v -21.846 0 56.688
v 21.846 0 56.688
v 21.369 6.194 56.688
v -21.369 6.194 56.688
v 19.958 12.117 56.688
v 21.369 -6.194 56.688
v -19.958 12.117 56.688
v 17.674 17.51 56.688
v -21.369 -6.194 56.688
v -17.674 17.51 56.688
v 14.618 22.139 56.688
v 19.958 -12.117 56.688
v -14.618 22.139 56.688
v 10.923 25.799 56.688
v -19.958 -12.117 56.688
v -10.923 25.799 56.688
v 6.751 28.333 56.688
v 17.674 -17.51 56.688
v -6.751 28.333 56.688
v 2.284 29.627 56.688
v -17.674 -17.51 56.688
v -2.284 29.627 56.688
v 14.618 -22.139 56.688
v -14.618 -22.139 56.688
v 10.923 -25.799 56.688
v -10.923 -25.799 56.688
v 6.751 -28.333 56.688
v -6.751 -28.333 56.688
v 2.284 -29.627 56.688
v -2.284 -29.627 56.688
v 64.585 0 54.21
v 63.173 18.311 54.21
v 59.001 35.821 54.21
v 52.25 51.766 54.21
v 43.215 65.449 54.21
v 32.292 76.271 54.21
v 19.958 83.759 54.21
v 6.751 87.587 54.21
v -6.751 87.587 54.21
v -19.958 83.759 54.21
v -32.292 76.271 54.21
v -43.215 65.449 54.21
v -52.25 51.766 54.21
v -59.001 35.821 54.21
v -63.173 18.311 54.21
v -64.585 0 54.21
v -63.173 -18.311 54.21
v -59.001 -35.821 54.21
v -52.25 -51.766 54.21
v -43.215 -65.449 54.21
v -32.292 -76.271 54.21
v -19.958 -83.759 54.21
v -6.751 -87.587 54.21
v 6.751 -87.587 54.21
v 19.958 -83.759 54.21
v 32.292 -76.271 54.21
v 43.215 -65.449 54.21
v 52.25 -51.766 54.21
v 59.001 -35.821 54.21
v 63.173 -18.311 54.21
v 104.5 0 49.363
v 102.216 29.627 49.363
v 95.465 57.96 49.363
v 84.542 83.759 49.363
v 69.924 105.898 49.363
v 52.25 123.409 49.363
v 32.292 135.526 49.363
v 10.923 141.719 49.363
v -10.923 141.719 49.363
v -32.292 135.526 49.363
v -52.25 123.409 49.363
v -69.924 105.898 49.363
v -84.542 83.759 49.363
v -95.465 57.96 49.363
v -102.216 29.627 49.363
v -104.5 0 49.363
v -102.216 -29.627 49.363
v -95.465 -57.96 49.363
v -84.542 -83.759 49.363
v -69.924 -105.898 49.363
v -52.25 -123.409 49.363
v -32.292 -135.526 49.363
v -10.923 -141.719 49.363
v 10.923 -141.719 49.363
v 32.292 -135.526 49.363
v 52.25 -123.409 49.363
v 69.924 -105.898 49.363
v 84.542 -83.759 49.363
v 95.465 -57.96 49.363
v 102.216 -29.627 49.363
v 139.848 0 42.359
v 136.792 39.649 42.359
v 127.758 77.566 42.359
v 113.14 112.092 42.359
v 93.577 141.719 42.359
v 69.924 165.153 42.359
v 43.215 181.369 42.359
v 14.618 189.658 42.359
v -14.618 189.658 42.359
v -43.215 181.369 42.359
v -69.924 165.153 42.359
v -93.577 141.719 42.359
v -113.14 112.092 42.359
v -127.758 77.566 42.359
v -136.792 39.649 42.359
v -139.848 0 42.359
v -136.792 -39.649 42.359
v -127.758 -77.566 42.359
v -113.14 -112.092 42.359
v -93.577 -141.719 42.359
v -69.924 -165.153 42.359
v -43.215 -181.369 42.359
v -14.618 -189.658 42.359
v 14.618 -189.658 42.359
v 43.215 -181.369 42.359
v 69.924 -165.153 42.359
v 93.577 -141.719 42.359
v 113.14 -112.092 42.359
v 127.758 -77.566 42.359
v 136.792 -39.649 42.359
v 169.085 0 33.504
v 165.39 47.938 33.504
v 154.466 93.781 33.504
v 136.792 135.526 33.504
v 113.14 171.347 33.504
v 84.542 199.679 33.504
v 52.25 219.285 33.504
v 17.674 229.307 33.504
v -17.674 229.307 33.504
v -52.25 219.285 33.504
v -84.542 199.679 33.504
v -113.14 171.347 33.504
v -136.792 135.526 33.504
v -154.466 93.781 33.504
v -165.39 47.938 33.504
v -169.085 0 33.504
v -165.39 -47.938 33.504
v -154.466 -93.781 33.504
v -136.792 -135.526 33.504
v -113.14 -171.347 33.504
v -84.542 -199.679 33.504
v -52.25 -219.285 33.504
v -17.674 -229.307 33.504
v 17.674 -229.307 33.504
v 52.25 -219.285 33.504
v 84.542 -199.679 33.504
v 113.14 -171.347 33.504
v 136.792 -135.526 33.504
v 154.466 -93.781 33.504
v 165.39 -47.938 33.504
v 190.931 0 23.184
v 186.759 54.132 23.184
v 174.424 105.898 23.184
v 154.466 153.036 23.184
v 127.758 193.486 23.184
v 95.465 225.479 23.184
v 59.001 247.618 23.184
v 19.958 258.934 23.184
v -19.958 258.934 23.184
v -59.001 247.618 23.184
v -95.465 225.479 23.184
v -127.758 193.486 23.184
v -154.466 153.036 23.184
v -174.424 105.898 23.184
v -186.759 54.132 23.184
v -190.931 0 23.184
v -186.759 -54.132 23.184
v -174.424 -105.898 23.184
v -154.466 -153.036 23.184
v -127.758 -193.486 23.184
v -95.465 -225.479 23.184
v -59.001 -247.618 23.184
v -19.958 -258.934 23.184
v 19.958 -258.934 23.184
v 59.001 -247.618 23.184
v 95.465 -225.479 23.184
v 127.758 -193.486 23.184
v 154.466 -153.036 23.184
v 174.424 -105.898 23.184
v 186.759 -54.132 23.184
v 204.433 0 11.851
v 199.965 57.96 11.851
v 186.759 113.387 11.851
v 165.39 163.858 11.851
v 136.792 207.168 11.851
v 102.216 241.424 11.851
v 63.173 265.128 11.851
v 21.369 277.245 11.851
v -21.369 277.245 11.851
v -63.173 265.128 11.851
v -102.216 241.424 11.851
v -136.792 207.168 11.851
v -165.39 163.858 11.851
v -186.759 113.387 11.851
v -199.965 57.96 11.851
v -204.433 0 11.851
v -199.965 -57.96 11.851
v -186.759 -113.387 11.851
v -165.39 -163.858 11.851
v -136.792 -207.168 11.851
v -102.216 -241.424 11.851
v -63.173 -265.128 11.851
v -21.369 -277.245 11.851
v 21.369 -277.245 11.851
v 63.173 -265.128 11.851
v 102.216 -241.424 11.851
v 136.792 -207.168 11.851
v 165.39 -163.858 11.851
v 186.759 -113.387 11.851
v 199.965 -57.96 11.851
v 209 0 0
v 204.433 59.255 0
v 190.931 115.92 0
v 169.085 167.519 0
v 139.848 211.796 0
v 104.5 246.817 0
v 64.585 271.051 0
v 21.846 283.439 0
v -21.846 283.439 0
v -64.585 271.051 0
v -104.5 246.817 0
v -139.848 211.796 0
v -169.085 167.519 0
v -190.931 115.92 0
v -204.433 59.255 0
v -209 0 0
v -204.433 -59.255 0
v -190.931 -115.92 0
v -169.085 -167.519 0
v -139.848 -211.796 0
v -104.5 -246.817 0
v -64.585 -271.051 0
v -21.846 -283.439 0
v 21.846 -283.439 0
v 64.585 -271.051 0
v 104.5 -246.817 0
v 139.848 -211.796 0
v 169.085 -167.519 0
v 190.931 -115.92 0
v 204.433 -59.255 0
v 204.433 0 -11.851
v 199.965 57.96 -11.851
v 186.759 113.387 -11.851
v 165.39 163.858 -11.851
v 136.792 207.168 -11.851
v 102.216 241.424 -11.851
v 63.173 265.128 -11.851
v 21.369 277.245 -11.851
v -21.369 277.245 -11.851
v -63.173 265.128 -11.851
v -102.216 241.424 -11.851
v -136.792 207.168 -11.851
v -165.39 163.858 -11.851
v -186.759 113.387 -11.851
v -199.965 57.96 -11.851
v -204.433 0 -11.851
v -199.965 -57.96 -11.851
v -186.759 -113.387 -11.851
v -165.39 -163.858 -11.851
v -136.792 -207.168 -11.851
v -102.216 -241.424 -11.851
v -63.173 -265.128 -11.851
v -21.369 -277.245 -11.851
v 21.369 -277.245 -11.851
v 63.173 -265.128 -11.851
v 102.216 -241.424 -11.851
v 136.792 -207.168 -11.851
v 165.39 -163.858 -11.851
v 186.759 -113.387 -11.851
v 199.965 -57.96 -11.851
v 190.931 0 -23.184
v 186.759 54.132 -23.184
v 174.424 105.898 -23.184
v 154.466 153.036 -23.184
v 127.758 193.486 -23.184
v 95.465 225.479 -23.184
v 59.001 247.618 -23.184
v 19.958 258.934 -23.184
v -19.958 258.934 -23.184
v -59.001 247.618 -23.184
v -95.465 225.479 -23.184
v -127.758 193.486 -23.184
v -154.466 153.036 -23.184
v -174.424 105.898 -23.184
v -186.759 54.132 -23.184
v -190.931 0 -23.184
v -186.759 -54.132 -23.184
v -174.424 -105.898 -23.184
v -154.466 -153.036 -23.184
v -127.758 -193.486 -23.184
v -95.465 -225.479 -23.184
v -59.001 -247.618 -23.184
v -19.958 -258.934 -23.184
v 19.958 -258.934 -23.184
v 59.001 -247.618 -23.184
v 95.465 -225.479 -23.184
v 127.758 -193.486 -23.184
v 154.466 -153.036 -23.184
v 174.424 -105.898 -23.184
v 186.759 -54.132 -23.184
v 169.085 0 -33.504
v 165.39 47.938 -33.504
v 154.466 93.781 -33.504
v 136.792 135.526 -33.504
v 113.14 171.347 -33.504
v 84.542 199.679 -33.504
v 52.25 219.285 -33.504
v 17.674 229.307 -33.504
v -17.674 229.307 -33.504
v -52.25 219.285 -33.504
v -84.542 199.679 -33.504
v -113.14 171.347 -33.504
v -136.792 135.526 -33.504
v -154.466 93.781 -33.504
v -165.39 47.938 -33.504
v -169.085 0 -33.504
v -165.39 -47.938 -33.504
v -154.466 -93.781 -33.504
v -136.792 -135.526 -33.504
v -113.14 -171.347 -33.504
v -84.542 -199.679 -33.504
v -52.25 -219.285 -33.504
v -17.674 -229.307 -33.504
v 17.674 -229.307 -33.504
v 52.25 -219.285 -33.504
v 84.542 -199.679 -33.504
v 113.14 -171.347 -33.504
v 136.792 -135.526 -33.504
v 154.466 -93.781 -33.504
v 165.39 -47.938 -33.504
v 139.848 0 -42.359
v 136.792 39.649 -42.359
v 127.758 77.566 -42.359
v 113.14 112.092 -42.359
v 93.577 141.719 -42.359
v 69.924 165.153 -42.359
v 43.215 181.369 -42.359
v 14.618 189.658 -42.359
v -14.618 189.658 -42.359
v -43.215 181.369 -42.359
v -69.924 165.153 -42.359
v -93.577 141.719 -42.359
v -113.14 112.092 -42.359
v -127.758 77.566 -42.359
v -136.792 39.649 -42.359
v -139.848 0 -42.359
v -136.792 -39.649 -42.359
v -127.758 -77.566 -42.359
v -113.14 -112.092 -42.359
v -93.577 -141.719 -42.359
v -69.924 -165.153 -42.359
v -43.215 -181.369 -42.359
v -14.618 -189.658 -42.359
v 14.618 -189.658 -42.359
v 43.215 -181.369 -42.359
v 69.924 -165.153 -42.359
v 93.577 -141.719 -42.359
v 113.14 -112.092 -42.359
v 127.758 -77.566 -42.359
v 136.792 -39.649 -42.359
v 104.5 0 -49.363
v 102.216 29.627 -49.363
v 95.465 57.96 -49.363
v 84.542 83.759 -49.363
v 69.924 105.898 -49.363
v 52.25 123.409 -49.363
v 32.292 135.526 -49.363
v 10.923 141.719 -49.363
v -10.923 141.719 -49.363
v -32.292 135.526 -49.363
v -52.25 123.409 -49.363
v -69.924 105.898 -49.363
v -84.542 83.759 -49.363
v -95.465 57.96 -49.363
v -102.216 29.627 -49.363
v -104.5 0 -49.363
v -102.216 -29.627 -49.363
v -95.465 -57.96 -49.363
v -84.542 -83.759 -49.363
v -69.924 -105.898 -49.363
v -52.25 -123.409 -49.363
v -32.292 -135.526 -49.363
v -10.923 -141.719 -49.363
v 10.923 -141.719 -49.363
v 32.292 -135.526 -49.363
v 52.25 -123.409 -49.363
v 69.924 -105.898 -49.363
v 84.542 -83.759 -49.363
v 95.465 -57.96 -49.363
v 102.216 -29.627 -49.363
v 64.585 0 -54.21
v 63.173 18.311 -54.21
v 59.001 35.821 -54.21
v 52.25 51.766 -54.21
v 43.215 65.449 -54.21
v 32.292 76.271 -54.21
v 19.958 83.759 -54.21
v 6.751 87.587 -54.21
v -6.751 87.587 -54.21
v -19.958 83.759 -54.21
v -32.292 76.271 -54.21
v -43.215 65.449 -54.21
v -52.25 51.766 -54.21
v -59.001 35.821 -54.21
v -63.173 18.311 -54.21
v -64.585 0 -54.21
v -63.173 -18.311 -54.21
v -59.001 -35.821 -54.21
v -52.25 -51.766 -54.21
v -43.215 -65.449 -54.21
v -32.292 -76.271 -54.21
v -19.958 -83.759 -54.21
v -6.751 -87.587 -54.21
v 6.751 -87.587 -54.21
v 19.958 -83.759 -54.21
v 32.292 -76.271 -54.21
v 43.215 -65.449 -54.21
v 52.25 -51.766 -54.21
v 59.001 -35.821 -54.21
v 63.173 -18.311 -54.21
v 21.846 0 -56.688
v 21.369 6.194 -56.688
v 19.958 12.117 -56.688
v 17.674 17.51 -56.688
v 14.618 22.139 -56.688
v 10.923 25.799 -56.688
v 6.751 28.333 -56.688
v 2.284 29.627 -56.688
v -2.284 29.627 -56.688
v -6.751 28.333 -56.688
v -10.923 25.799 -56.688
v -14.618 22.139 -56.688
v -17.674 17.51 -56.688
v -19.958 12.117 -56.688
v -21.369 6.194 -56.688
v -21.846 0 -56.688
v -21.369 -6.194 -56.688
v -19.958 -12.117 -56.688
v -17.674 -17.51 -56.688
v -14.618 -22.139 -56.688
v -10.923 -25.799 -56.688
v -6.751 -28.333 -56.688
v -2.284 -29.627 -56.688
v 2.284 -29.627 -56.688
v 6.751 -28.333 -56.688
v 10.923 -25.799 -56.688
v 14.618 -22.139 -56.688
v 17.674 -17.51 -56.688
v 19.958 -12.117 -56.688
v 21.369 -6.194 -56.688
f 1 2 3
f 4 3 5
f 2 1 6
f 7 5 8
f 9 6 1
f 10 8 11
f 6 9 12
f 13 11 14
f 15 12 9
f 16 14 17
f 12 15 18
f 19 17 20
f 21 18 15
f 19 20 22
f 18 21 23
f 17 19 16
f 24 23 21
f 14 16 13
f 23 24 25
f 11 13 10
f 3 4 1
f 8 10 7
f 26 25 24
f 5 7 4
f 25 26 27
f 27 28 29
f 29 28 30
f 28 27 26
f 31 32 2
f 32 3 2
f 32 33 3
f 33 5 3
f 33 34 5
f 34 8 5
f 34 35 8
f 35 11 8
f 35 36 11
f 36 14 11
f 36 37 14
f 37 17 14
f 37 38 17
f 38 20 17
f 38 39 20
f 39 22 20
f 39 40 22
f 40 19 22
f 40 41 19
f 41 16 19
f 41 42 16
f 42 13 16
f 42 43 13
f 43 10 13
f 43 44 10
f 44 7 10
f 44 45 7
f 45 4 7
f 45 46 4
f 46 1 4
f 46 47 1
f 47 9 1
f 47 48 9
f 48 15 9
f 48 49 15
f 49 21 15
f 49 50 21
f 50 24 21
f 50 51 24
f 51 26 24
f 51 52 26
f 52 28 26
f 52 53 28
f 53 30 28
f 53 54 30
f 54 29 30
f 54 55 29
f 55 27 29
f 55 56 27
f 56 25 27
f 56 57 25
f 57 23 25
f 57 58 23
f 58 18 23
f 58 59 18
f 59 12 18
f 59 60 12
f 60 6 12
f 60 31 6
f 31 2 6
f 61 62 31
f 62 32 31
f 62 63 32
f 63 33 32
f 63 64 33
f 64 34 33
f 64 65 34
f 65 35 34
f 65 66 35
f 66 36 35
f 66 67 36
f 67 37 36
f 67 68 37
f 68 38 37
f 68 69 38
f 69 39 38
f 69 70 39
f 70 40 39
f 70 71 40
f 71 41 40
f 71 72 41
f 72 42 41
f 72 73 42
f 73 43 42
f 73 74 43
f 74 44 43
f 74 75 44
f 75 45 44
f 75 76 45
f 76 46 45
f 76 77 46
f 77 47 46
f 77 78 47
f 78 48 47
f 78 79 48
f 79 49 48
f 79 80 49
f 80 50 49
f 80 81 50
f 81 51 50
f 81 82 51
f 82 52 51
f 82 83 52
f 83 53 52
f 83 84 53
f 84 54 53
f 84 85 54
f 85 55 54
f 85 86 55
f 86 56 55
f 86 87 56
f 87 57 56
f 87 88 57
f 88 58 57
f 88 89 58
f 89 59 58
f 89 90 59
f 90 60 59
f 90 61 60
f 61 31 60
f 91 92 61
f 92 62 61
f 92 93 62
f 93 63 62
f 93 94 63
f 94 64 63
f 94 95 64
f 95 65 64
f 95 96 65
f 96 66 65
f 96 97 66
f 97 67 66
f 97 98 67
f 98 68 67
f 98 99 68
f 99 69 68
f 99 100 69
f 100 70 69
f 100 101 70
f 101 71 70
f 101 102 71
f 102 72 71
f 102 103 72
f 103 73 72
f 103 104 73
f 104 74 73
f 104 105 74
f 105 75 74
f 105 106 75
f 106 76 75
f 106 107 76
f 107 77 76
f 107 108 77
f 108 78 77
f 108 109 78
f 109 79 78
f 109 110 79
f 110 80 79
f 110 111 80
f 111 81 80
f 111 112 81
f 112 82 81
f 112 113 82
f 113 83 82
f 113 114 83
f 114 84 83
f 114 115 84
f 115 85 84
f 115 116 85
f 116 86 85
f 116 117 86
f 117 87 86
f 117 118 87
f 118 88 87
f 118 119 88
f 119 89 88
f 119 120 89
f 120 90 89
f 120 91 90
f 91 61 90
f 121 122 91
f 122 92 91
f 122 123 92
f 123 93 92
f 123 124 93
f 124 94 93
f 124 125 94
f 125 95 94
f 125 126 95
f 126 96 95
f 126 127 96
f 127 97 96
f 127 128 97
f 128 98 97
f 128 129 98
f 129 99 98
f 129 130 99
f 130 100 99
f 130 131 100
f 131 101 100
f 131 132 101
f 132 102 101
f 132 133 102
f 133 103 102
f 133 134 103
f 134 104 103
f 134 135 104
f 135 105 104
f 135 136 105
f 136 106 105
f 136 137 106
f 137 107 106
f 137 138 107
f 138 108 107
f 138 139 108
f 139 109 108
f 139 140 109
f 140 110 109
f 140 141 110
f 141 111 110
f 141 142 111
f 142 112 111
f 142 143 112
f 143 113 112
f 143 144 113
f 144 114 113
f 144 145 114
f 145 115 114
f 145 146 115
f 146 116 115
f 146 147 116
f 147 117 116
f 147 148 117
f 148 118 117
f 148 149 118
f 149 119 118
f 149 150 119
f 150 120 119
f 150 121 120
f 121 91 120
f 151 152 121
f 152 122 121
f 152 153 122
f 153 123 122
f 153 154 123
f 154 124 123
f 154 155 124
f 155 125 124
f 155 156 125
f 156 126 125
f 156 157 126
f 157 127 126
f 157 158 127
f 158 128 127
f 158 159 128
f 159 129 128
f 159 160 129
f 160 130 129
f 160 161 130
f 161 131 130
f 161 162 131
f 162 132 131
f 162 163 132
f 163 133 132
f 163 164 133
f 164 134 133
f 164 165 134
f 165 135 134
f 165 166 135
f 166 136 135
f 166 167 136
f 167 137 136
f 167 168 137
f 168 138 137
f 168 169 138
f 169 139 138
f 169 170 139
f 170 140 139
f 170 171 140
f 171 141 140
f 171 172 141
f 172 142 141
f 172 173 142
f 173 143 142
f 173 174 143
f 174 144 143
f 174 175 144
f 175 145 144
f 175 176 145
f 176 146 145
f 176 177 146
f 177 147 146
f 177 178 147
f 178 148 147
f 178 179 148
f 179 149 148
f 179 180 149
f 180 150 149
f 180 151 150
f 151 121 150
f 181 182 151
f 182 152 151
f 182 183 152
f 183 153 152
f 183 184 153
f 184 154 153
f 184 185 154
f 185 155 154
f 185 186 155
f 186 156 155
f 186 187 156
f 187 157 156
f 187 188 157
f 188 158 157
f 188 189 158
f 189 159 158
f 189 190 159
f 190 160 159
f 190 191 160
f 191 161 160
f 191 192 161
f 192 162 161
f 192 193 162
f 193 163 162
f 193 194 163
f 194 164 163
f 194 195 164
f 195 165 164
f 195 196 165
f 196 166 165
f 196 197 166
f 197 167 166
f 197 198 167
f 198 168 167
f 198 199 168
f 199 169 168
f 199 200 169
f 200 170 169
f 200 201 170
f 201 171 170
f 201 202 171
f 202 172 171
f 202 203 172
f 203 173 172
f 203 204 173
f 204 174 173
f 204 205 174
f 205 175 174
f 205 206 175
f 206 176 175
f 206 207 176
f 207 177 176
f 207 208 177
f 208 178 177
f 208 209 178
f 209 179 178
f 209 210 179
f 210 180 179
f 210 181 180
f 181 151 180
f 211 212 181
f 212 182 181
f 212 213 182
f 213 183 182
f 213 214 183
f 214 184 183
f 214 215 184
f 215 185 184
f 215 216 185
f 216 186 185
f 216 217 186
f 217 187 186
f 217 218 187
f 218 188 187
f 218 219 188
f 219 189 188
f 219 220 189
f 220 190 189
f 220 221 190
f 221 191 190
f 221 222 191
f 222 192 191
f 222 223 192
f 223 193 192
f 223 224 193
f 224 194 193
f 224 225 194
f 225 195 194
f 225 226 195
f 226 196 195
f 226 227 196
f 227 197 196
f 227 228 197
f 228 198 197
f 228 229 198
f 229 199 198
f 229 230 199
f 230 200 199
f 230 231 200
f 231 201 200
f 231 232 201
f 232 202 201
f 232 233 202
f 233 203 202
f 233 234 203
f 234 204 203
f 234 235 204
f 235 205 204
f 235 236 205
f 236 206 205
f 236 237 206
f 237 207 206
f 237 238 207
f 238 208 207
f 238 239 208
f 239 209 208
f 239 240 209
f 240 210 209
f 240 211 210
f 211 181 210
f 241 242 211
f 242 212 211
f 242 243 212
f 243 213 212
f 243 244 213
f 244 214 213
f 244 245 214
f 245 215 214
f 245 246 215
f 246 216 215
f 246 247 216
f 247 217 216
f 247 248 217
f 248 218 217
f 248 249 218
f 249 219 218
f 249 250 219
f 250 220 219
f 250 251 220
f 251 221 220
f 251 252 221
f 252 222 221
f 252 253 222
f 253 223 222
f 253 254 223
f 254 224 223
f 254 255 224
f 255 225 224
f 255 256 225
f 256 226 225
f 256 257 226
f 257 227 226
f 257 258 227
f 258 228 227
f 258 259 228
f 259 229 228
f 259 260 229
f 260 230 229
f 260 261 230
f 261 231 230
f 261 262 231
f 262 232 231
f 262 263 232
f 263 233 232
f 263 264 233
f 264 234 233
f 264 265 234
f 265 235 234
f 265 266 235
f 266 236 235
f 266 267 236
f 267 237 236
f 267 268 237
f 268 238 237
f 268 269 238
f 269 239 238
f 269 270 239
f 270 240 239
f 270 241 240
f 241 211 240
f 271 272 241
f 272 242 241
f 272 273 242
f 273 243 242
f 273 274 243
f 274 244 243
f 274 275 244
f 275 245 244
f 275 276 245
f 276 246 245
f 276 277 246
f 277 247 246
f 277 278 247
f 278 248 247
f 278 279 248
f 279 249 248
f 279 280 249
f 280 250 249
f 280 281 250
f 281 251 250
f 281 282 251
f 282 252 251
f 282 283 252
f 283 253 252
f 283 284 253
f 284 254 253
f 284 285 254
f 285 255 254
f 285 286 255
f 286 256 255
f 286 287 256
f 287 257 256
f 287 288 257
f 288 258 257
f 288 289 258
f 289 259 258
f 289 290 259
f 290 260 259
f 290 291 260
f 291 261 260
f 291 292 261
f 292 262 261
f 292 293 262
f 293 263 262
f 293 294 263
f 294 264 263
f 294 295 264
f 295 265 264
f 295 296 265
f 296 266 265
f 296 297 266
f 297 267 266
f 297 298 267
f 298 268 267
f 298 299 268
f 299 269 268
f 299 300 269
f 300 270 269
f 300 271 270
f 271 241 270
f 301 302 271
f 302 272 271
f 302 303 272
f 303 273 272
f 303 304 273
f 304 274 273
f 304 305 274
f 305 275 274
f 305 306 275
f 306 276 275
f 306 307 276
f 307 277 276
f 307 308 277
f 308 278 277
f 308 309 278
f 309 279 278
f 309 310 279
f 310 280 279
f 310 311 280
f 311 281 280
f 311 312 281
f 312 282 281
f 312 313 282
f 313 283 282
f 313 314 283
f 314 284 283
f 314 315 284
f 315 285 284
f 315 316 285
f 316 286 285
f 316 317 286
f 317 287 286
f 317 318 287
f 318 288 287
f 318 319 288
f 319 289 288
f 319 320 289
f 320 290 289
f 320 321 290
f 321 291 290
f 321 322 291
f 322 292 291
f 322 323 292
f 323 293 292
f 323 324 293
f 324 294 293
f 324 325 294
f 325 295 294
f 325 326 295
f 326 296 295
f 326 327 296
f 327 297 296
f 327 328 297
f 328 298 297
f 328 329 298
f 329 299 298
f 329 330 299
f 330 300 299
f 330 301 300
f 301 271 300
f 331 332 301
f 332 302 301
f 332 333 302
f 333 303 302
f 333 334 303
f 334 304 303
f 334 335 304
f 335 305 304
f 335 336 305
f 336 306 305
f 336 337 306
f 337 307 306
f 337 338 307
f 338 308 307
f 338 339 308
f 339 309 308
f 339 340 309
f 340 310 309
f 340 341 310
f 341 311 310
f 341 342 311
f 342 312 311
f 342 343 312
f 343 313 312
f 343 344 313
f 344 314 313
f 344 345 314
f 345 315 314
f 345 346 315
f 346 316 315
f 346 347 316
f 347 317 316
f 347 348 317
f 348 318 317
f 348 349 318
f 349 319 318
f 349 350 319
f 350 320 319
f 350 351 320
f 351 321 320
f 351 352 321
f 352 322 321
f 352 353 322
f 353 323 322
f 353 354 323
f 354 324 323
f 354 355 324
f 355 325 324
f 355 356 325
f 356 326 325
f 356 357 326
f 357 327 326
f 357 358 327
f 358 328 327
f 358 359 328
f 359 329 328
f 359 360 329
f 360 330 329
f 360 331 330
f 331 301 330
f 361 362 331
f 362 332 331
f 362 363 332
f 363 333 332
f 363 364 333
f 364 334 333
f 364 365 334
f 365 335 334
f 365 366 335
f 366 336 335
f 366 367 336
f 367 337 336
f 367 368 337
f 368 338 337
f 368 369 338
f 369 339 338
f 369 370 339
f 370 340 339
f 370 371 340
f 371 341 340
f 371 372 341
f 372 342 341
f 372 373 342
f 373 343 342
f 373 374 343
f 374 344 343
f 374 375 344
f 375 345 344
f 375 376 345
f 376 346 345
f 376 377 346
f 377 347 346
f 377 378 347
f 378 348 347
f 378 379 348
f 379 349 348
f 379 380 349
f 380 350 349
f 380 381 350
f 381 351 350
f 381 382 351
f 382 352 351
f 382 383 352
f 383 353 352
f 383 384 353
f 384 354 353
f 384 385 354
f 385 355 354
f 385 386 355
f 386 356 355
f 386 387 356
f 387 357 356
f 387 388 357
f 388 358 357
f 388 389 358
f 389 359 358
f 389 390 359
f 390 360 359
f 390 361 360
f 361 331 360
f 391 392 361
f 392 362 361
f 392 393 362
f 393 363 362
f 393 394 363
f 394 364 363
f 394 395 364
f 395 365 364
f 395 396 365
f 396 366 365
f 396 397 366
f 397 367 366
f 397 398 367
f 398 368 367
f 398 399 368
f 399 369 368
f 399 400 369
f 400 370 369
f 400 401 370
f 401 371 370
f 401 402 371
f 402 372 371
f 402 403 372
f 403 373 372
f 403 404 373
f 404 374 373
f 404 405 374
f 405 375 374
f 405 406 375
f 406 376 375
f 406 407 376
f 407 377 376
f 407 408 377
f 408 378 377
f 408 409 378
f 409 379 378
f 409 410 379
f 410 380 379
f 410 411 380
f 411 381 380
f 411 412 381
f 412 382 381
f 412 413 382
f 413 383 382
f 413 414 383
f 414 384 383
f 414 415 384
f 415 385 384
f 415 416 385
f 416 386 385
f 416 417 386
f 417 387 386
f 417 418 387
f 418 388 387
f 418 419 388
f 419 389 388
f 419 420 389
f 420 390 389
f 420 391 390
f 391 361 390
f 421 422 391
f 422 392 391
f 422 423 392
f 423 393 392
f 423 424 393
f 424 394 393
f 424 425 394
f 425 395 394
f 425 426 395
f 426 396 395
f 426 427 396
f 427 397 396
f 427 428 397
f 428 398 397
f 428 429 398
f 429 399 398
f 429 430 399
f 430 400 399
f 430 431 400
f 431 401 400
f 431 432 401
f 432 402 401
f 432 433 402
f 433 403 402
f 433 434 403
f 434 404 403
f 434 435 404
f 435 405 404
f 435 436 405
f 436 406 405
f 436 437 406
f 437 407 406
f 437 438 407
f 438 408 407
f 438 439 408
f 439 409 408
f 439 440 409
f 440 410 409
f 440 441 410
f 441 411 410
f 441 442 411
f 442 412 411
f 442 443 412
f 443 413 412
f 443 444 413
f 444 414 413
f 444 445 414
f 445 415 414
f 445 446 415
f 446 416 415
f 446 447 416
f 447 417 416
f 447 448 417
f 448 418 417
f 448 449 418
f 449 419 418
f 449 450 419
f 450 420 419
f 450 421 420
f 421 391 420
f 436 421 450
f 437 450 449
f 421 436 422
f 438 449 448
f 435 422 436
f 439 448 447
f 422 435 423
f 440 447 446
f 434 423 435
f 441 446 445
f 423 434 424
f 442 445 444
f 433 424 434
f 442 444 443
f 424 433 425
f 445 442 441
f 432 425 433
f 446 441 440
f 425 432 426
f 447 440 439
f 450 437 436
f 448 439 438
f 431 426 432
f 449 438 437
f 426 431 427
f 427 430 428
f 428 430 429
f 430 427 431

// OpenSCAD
// Generated by SolidPython 1.0.1 on 2020-07-29 00:46:50


scale(v = [11, 15, 3]) {
	sphere(r = 19);
}
/***********************************************
*********      SolidPython code:      **********
************************************************
 
# import packages: SolidPython
from solid import *
from solid.utils import *
from itertools import chain, combinations, permutations


class Resize:

    def __init__(self, scad_file):
        self.scad_file = scad_file
        #self.scad_file = import_scad(scad_file)
        # cone/cylinder param:
        self.r1 = 0
        self.r2 = 0
        self.h = 0
        # rectangular prism param:
        self.w = 0
        self.l = 0
        # ellipse param:
        self.r = 0

    # import OpenScad code (file name corresponds to shape)


    # classify shape + parameters
    def assign(self, param1, param2, param3):
        if self.scad_file == 'cone.scad':
            self.r1 = param1
            self.r2 = param2
            self.h = param3
        elif self.scad_file == 'cylinder.scad':
            self.r1 = param1
            self.r2 = param2
            self.h = param3
        elif self.scad_file == 'rectangularPrism.scad':
            self.h = param1
            self.l = param2
            self.w = param3
        else:
            self.r = param1
            self.h = param2

    # resize parameters
    def iterate(self):
        x = range(3, 20, 2)
        i = 1
        if self.scad_file == 'cone.scad':
            tempList = list(permutations(x, 2))
            for temp in tempList:
                param1 = temp[0]
                param2 = temp[1]
                filepath = 'produced_scad_files/' + 'cone' + str(param1) + '_' + str(param2) + '_' + '.scad'
                scad_render_to_file(cylinder(h=param1, r1=param2, r2=0), filepath)

        elif self.scad_file == 'cylinder.scad':
            tempList = list(permutations(x, 3))
            for temp in tempList:
                param1 = temp[0]
                param2 = temp[1]
                filepath = 'produced_scad_files/' + 'cylinder' + str(param1) + '_' + str(param2) + '_' + '.scad'
                scad_render_to_file(cylinder(h=param1, r1=param2, r2=param2), filepath)

        elif self.scad_file == 'rectangularPrism.scad':
            tempList = list(permutations(x, 3))
            for temp in tempList:
                param1 = temp[0]
                param2 = temp[1]
                param3 = temp[2]
                filepath = 'produced_scad_files/' + 'rectangularPrism' + str(param1) + '_' + str(param2) + '_' + str(
                    param3) + '.scad'
                scad_render_to_file(cube(size=(param1, param2, param3)), filepath)

        elif self.scad_file == 'ellipse.scad':
            tempList = list(permutations(x, 4))
            for temp in tempList:
                param1 = temp[0]
                param2 = temp[1]
                param3 = temp[2]
                param4 = temp[3]
                filepath = 'produced_scad_files/' + 'ellipse' + str(param1) + '_' + str(param2) + '_' + str(param3) + '_' + str(param4) + '.scad'
                scad_render_to_file(scale([param1, param2, param3])(sphere(r=param4)), filepath)

    def render_to_scadfile(self):
        scad_render_to_file(scad, 'example.scad') 
 
************************************************/
